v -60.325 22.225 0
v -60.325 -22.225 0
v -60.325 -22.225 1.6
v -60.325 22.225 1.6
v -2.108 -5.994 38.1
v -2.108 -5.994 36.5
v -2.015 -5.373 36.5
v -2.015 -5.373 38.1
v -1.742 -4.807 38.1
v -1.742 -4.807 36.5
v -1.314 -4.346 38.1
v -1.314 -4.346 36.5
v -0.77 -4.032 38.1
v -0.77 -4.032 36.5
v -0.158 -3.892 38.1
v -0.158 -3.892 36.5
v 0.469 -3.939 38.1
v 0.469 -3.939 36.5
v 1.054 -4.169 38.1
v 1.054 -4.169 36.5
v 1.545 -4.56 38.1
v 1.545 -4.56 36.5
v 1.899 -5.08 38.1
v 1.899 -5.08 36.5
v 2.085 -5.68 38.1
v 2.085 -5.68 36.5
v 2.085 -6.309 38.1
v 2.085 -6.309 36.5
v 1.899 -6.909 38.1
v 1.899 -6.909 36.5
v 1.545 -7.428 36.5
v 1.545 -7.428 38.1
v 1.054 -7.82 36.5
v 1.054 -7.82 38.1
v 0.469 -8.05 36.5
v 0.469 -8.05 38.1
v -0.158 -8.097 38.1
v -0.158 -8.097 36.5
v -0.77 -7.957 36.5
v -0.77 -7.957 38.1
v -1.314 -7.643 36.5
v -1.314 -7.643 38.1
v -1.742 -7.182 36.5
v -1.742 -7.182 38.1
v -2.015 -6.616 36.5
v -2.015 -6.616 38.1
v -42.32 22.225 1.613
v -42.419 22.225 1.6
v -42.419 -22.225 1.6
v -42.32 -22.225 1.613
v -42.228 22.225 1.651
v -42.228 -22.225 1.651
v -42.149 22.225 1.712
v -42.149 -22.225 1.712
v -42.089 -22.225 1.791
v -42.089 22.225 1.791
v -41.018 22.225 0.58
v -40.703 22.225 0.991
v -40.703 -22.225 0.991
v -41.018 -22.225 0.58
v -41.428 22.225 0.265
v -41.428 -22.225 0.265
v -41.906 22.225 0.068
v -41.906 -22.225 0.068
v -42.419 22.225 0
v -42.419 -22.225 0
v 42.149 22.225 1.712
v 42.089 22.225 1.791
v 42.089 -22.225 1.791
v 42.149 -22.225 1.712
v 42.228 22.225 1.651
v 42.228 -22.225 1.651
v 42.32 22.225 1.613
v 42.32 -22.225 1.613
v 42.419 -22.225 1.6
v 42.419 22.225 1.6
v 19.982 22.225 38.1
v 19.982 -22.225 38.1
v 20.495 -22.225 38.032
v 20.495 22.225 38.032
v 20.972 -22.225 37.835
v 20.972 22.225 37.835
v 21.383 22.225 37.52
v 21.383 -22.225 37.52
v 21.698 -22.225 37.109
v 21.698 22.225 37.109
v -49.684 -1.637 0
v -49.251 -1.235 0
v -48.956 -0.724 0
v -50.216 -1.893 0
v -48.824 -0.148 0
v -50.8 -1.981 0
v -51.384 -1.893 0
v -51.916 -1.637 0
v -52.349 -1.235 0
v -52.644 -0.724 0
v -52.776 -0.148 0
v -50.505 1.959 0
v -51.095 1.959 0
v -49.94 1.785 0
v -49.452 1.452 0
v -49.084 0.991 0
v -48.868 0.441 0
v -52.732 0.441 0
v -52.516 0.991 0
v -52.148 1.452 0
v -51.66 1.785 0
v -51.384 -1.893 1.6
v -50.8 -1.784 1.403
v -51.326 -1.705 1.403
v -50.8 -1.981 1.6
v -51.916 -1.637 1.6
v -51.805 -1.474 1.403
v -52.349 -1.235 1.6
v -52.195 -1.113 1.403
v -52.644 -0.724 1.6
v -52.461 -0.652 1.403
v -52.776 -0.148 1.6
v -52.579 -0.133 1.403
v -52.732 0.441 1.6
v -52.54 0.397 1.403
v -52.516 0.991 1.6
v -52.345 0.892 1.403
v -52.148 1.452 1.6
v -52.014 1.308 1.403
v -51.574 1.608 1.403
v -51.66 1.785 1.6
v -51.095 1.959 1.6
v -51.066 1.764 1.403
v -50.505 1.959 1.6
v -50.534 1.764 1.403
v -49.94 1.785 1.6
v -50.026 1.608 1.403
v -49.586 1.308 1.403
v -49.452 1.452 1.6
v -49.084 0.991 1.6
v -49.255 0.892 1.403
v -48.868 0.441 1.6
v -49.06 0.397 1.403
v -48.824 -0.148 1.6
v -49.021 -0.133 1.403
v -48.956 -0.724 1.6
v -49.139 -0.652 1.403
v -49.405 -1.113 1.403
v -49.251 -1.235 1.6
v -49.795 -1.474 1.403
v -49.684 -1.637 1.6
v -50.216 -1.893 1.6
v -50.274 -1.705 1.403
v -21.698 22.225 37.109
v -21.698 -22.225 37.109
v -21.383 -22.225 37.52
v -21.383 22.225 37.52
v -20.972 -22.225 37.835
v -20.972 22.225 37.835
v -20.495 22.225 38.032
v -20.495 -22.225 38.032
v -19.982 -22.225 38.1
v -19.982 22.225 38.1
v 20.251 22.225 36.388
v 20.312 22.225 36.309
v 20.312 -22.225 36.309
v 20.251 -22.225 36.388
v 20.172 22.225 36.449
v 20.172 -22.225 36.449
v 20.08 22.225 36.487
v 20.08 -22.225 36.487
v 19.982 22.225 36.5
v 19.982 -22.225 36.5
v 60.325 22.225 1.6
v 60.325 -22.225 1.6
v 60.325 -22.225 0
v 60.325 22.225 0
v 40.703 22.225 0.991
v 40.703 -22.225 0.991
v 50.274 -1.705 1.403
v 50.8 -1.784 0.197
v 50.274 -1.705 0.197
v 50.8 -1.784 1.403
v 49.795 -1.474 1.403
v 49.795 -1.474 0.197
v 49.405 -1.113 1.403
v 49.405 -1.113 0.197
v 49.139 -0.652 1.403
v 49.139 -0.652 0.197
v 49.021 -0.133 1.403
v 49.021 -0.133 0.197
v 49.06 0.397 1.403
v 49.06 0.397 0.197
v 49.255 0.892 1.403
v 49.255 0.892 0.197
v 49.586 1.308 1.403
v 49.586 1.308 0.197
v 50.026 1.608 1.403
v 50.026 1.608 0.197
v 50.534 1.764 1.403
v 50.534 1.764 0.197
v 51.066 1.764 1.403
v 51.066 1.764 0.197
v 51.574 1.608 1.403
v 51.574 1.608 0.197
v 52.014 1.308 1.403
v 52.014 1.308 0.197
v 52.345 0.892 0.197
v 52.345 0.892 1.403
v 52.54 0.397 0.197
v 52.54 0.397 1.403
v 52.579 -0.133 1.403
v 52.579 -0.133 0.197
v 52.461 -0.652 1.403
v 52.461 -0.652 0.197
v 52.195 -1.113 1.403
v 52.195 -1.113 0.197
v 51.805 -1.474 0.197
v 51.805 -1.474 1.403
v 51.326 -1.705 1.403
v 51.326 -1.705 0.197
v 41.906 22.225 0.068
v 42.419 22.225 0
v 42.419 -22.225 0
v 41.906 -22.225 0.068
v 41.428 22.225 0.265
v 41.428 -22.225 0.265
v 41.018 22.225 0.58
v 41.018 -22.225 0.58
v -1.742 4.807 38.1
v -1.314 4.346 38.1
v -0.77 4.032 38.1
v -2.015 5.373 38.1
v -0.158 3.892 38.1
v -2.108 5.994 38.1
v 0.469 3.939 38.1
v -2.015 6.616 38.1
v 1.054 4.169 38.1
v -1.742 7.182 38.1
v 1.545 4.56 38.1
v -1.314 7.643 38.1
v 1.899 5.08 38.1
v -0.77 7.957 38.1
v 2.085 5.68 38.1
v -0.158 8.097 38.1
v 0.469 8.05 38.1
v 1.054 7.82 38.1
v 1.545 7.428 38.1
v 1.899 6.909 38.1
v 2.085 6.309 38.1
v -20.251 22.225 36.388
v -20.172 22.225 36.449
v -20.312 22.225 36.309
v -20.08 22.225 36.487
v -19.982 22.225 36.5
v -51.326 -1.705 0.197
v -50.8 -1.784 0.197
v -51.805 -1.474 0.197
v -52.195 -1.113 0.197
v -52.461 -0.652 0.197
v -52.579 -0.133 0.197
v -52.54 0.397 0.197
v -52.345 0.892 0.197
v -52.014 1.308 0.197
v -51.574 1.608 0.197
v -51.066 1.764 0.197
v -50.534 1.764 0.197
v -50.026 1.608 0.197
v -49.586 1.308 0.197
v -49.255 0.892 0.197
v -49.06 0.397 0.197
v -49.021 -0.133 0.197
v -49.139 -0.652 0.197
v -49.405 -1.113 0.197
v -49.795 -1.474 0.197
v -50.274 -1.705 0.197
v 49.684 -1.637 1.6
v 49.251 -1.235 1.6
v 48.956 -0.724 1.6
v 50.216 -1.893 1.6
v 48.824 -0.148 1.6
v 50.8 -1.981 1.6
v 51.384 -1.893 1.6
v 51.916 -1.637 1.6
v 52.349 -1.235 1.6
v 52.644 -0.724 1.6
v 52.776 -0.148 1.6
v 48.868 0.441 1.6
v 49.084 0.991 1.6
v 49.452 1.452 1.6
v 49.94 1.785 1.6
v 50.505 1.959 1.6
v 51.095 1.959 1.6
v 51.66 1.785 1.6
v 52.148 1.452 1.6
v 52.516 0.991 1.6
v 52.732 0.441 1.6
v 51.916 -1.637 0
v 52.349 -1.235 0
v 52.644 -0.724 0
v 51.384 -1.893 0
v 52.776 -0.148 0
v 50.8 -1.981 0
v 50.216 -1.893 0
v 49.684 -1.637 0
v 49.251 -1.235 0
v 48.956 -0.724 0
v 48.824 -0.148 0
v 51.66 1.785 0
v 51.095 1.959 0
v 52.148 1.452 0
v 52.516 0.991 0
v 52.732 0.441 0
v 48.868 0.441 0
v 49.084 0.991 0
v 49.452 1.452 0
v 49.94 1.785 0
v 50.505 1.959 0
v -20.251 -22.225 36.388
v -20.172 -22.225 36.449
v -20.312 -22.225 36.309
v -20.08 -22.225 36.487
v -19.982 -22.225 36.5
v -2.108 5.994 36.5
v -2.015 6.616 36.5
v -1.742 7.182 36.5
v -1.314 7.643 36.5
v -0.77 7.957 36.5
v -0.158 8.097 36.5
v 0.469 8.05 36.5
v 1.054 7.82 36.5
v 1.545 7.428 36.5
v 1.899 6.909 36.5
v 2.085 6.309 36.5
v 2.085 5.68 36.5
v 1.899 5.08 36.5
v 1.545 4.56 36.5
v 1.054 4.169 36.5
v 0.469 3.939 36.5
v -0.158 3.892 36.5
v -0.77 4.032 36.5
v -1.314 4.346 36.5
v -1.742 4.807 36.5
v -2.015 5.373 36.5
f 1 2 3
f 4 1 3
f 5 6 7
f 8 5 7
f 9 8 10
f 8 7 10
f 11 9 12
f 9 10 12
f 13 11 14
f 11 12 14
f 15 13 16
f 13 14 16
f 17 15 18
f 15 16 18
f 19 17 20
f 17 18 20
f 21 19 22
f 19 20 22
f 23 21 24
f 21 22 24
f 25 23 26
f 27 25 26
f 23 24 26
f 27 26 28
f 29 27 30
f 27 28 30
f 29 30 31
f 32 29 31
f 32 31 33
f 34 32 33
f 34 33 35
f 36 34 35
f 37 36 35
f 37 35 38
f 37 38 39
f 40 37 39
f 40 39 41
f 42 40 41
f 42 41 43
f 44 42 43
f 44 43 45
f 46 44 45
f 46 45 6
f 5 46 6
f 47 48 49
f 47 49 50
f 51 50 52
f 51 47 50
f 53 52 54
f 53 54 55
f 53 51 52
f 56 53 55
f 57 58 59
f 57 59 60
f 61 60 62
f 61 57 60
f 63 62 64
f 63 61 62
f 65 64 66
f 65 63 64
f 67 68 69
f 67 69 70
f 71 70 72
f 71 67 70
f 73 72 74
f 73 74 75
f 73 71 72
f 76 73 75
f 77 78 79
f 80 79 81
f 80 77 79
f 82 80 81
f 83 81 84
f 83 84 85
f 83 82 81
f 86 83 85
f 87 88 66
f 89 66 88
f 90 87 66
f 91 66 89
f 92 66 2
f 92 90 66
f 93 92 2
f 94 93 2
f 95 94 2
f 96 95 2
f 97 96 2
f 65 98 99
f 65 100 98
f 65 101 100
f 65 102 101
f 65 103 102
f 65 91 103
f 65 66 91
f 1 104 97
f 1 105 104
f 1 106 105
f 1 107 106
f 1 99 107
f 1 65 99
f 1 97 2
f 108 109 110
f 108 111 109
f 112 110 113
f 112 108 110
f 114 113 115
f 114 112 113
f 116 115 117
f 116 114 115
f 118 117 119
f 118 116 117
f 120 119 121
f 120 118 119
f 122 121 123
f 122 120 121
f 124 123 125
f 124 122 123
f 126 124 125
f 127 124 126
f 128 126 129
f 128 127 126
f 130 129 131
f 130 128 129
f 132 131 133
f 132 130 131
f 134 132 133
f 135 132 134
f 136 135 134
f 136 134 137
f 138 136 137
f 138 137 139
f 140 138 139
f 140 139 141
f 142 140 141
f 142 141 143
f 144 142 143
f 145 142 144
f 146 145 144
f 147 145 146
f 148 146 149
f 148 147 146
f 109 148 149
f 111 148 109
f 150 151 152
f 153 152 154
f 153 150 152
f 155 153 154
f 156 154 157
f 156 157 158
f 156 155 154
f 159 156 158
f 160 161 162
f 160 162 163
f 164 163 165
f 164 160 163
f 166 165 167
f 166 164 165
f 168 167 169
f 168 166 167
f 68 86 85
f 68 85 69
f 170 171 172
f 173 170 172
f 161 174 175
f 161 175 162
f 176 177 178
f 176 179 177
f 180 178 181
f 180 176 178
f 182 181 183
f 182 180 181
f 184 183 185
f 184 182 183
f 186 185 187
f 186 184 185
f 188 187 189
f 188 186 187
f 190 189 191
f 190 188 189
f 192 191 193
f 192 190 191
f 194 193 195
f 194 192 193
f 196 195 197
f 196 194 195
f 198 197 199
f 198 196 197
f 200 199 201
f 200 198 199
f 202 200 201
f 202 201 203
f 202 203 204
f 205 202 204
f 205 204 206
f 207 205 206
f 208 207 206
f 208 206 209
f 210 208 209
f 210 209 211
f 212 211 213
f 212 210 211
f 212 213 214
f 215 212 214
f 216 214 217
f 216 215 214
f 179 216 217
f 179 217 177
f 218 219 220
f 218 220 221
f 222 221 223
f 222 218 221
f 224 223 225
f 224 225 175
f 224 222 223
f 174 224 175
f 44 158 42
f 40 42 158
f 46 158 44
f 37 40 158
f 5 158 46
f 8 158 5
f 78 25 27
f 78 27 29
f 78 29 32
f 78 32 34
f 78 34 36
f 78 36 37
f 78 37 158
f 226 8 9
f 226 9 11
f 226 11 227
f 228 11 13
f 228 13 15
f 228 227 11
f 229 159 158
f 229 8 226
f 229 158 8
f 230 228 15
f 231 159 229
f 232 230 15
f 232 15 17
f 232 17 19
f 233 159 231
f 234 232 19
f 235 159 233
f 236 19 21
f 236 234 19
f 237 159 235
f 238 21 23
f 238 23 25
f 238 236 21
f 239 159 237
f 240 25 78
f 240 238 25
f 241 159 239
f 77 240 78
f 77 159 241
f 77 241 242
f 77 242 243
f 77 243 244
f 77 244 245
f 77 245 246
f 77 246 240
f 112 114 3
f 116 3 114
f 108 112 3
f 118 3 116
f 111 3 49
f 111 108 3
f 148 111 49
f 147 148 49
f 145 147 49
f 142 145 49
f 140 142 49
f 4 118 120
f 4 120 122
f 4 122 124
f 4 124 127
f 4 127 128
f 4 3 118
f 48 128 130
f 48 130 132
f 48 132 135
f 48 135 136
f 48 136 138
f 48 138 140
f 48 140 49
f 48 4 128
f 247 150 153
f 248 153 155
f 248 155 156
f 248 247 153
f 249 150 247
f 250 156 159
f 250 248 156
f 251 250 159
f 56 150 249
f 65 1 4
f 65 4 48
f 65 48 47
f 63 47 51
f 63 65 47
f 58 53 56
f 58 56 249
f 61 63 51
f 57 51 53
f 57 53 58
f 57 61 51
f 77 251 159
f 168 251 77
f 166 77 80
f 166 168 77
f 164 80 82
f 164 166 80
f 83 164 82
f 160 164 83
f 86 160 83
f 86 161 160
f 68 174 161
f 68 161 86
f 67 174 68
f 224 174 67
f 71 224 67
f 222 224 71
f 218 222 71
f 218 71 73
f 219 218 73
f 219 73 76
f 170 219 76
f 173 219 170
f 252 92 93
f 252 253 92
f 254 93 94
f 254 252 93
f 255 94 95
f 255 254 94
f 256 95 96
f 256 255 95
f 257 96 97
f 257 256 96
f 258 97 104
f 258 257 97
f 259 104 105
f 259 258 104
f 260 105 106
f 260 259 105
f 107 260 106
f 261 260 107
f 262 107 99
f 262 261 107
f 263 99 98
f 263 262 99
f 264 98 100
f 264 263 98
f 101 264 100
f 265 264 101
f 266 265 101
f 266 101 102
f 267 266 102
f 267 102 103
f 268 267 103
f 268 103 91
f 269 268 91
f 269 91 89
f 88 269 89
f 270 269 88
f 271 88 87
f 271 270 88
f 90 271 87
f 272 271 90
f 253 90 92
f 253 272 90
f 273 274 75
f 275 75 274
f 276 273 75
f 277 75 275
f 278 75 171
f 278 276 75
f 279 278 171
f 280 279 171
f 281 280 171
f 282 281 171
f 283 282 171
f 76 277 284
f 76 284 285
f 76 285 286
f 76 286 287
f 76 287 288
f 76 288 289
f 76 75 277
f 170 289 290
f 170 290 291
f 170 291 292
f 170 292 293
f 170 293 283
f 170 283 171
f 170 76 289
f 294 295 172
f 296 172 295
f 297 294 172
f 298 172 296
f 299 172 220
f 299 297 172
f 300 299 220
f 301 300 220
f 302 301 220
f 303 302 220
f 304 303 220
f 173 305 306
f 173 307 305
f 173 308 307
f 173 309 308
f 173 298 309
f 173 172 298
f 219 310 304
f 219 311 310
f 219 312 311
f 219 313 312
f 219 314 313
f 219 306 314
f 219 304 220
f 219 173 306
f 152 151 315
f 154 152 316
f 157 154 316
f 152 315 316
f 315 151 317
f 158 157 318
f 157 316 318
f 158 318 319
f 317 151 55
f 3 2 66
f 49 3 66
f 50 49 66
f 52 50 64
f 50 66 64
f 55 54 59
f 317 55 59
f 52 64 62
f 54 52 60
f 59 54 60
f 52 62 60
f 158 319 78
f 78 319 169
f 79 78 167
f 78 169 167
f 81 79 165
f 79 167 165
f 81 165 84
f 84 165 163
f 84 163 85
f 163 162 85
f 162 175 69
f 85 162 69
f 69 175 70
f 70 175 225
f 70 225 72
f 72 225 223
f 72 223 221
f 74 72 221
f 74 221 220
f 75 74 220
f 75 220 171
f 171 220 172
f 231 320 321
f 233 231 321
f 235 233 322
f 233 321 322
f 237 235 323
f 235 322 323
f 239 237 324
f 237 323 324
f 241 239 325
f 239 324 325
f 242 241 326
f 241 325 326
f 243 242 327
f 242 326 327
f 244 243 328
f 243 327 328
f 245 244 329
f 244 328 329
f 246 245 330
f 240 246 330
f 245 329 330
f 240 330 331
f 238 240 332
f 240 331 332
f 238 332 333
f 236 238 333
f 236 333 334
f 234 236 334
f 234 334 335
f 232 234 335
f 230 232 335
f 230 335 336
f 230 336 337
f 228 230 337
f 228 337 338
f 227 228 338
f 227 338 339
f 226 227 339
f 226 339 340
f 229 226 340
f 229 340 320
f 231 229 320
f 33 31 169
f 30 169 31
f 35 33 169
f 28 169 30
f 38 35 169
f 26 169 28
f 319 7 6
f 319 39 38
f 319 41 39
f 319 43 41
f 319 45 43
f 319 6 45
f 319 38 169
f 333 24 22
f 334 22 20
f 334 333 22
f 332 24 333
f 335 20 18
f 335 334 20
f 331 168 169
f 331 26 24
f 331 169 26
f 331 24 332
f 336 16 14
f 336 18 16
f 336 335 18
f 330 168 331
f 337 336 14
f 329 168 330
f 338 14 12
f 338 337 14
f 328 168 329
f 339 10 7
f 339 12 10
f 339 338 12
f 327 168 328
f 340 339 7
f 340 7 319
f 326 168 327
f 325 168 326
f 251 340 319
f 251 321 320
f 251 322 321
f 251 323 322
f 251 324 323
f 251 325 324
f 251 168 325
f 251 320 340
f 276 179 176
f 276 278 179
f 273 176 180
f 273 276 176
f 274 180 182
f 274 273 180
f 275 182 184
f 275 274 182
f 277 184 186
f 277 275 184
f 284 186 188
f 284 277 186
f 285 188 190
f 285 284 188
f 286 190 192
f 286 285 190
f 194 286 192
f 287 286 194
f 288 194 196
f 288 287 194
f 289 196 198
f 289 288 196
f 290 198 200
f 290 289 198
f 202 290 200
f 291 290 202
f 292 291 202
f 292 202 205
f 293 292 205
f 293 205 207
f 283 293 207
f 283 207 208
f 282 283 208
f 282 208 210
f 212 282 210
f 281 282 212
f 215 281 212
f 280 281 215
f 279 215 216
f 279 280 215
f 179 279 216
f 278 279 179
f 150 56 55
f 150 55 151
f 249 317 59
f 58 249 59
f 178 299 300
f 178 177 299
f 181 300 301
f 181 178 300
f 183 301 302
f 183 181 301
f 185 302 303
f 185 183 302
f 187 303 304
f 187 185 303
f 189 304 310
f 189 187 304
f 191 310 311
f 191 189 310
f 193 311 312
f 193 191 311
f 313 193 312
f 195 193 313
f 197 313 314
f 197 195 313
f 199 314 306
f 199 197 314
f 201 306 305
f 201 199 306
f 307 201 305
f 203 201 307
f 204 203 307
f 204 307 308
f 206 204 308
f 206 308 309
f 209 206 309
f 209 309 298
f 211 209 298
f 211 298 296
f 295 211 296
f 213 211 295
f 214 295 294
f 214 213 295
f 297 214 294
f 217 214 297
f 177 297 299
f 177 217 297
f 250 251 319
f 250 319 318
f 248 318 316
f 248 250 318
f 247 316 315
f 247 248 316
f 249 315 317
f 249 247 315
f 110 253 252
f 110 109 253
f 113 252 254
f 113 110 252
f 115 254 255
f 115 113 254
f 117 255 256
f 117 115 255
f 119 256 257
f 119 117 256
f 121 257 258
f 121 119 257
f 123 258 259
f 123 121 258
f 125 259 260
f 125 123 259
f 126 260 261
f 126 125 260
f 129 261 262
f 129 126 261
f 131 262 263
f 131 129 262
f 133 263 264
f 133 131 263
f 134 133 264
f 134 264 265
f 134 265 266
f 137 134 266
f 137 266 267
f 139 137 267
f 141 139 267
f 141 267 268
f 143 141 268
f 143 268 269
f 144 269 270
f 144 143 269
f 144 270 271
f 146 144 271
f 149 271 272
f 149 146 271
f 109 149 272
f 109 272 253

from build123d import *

# Parameters (mm, degrees)
BASE_FLANGE1_DEPTH                    = 22.225
F_28_0_1405_DIAMETER_HOLE1_AT_2_COUNT = 2
F_28_0_1405_DIAMETER_HOLE1_AT_2_PITCH = 101.6
F_19_0_166_DIAMETER_HOLE1_D           = 4.2164


# Sheet-metal steps are written as plain solids
with BuildPart() as part:
    # Sketch2 → Base-Flange1 (new, symmetric)
    with BuildSketch(Plane(origin=(0, 0, 0), x_dir=(1, 0, 0), z_dir=(0, 1, 0))):
        with BuildLine():
            Line((60.325, 0), (42.418846353, 0))
            ThreePointArc((42.418846353, 0), (41.428246353, -0.26543047), (40.703076823, -0.9906))
            Line((40.703076823, -0.9906), (20.311815871, -36.3093))
            ThreePointArc((20.311815871, -36.3093), (20.172360192, -36.448755679), (19.981860192, -36.4998))
            Line((19.981860192, -36.4998), (-19.981860192, -36.4998))
            ThreePointArc((-19.981860192, -36.4998), (-20.172360192, -36.448755679), (-20.311815871, -36.3093))
            Line((-20.311815871, -36.3093), (-40.703076823, -0.9906))
            ThreePointArc((-40.703076823, -0.9906), (-41.428246353, -0.26543047), (-42.418846353, 0))
            Line((-42.418846353, 0), (-60.325, 0))
            Line((-60.325, 0), (-60.325, -1.6002))
            Line((-60.325, -1.6002), (-42.418846353, -1.6002))
            ThreePointArc((-42.418846353, -1.6002), (-42.228346353, -1.651244321), (-42.088890674, -1.7907))
            Line((-42.088890674, -1.7907), (-21.697629722, -37.1094))
            ThreePointArc((-21.697629722, -37.1094), (-20.972460192, -37.83456953), (-19.981860192, -38.1))
            Line((-19.981860192, -38.1), (19.981860192, -38.1))
            ThreePointArc((19.981860192, -38.1), (20.972460192, -37.83456953), (21.697629722, -37.1094))
            Line((21.697629722, -37.1094), (42.088890674, -1.7907))
            ThreePointArc((42.088890674, -1.7907), (42.228346353, -1.651244321), (42.418846353, -1.6002))
            Line((42.418846353, -1.6002), (60.325, -1.6002))
            Line((60.325, -1.6002), (60.325, 0))
        make_face()
    extrude(amount=BASE_FLANGE1_DEPTH, both=True)

    # Sketch4 → #28 (0.1405) Diameter Hole1 (revolve, cut)
    with BuildSketch(Plane(origin=(50.8, 0, 1.6002), x_dir=(0, -1, 0), z_dir=(1, 0, 0))):
        Polygon((0, 0), (0, 1.6002), (1.9812, 1.6002), (1.78435, 1.40335), (1.78435, 0.19685), (1.9812, 0), align=None)
    f_28_0_1405_diameter_hole1 = revolve(axis=Axis((50.8, 0, 7.9502), (0, 0, -1)), mode=Mode.SUBTRACT)

    # #28 (0.1405) Diameter Hole1 at 2: #28 (0.1405) Diameter Hole1 ×2
    with Locations(*[(-i * F_28_0_1405_DIAMETER_HOLE1_AT_2_PITCH, 0, 0) for i in range(1, F_28_0_1405_DIAMETER_HOLE1_AT_2_COUNT)]):
        add(f_28_0_1405_diameter_hole1, mode=Mode.SUBTRACT)

    # #19 (0.166) Diameter Hole1 (through all)
    with Locations(Plane.XY.offset(38.1)):
        with Locations((0, 5.9944), (0, -5.9944)):
            Hole(F_19_0_166_DIAMETER_HOLE1_D / 2)


solid = part.part
